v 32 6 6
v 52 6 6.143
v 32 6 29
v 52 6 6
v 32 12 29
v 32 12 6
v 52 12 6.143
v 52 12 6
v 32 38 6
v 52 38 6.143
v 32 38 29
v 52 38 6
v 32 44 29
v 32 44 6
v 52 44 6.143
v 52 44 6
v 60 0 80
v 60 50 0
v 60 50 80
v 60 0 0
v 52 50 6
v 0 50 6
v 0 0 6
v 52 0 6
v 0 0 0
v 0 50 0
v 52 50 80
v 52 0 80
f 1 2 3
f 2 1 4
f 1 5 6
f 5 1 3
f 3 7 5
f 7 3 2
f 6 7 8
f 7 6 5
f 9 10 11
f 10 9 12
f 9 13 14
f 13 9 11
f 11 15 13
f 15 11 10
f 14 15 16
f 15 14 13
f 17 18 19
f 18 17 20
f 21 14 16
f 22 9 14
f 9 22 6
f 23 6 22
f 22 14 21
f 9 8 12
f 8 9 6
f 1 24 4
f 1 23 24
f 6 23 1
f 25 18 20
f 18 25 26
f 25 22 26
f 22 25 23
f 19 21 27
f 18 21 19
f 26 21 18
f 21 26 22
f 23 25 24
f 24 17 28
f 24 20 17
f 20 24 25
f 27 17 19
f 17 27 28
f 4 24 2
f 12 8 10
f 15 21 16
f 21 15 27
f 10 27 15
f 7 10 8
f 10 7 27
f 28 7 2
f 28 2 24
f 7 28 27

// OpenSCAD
$fn = 32;

// ----------------------------------------------------------------------
// Rib bracket: 2-gusset L bracket
// ----------------------------------------------------------------------

// --- parameters (mm) ---
base_l = 60;              // foot length, X
base_w = 50;              // foot width, Y
base_t = 6;               // foot thickness
plate_t = 8;              // upright plate thickness
plate_h = 80;             // overall height
gus_l = 20;               // gusset leg along the foot
gus_h = 24;               // gusset height
gus_t = 6;                // gusset thickness
gus_edge = 6;             // gusset margin from the foot edge
n_gus = 2;                // gusset count

gus_pitch = (base_w - 2 * gus_edge - gus_t) / (n_gus - 1);  // gusset pitch

union() {
  cube([base_l, base_w, base_t]);
  translate([base_l - plate_t, 0, base_t - 1])
    cube([plate_t, base_w, plate_h - base_t + 1]);
  for (i = [0 : n_gus - 1])
    translate([base_l - plate_t - gus_l, gus_edge + i * gus_pitch, base_t - 1])
      rotate([-90, 0, 0])
        linear_extrude(height = gus_t)
          polygon(points = [[0, 0], [gus_l + 1, 0], [0, -gus_h]]);
}
